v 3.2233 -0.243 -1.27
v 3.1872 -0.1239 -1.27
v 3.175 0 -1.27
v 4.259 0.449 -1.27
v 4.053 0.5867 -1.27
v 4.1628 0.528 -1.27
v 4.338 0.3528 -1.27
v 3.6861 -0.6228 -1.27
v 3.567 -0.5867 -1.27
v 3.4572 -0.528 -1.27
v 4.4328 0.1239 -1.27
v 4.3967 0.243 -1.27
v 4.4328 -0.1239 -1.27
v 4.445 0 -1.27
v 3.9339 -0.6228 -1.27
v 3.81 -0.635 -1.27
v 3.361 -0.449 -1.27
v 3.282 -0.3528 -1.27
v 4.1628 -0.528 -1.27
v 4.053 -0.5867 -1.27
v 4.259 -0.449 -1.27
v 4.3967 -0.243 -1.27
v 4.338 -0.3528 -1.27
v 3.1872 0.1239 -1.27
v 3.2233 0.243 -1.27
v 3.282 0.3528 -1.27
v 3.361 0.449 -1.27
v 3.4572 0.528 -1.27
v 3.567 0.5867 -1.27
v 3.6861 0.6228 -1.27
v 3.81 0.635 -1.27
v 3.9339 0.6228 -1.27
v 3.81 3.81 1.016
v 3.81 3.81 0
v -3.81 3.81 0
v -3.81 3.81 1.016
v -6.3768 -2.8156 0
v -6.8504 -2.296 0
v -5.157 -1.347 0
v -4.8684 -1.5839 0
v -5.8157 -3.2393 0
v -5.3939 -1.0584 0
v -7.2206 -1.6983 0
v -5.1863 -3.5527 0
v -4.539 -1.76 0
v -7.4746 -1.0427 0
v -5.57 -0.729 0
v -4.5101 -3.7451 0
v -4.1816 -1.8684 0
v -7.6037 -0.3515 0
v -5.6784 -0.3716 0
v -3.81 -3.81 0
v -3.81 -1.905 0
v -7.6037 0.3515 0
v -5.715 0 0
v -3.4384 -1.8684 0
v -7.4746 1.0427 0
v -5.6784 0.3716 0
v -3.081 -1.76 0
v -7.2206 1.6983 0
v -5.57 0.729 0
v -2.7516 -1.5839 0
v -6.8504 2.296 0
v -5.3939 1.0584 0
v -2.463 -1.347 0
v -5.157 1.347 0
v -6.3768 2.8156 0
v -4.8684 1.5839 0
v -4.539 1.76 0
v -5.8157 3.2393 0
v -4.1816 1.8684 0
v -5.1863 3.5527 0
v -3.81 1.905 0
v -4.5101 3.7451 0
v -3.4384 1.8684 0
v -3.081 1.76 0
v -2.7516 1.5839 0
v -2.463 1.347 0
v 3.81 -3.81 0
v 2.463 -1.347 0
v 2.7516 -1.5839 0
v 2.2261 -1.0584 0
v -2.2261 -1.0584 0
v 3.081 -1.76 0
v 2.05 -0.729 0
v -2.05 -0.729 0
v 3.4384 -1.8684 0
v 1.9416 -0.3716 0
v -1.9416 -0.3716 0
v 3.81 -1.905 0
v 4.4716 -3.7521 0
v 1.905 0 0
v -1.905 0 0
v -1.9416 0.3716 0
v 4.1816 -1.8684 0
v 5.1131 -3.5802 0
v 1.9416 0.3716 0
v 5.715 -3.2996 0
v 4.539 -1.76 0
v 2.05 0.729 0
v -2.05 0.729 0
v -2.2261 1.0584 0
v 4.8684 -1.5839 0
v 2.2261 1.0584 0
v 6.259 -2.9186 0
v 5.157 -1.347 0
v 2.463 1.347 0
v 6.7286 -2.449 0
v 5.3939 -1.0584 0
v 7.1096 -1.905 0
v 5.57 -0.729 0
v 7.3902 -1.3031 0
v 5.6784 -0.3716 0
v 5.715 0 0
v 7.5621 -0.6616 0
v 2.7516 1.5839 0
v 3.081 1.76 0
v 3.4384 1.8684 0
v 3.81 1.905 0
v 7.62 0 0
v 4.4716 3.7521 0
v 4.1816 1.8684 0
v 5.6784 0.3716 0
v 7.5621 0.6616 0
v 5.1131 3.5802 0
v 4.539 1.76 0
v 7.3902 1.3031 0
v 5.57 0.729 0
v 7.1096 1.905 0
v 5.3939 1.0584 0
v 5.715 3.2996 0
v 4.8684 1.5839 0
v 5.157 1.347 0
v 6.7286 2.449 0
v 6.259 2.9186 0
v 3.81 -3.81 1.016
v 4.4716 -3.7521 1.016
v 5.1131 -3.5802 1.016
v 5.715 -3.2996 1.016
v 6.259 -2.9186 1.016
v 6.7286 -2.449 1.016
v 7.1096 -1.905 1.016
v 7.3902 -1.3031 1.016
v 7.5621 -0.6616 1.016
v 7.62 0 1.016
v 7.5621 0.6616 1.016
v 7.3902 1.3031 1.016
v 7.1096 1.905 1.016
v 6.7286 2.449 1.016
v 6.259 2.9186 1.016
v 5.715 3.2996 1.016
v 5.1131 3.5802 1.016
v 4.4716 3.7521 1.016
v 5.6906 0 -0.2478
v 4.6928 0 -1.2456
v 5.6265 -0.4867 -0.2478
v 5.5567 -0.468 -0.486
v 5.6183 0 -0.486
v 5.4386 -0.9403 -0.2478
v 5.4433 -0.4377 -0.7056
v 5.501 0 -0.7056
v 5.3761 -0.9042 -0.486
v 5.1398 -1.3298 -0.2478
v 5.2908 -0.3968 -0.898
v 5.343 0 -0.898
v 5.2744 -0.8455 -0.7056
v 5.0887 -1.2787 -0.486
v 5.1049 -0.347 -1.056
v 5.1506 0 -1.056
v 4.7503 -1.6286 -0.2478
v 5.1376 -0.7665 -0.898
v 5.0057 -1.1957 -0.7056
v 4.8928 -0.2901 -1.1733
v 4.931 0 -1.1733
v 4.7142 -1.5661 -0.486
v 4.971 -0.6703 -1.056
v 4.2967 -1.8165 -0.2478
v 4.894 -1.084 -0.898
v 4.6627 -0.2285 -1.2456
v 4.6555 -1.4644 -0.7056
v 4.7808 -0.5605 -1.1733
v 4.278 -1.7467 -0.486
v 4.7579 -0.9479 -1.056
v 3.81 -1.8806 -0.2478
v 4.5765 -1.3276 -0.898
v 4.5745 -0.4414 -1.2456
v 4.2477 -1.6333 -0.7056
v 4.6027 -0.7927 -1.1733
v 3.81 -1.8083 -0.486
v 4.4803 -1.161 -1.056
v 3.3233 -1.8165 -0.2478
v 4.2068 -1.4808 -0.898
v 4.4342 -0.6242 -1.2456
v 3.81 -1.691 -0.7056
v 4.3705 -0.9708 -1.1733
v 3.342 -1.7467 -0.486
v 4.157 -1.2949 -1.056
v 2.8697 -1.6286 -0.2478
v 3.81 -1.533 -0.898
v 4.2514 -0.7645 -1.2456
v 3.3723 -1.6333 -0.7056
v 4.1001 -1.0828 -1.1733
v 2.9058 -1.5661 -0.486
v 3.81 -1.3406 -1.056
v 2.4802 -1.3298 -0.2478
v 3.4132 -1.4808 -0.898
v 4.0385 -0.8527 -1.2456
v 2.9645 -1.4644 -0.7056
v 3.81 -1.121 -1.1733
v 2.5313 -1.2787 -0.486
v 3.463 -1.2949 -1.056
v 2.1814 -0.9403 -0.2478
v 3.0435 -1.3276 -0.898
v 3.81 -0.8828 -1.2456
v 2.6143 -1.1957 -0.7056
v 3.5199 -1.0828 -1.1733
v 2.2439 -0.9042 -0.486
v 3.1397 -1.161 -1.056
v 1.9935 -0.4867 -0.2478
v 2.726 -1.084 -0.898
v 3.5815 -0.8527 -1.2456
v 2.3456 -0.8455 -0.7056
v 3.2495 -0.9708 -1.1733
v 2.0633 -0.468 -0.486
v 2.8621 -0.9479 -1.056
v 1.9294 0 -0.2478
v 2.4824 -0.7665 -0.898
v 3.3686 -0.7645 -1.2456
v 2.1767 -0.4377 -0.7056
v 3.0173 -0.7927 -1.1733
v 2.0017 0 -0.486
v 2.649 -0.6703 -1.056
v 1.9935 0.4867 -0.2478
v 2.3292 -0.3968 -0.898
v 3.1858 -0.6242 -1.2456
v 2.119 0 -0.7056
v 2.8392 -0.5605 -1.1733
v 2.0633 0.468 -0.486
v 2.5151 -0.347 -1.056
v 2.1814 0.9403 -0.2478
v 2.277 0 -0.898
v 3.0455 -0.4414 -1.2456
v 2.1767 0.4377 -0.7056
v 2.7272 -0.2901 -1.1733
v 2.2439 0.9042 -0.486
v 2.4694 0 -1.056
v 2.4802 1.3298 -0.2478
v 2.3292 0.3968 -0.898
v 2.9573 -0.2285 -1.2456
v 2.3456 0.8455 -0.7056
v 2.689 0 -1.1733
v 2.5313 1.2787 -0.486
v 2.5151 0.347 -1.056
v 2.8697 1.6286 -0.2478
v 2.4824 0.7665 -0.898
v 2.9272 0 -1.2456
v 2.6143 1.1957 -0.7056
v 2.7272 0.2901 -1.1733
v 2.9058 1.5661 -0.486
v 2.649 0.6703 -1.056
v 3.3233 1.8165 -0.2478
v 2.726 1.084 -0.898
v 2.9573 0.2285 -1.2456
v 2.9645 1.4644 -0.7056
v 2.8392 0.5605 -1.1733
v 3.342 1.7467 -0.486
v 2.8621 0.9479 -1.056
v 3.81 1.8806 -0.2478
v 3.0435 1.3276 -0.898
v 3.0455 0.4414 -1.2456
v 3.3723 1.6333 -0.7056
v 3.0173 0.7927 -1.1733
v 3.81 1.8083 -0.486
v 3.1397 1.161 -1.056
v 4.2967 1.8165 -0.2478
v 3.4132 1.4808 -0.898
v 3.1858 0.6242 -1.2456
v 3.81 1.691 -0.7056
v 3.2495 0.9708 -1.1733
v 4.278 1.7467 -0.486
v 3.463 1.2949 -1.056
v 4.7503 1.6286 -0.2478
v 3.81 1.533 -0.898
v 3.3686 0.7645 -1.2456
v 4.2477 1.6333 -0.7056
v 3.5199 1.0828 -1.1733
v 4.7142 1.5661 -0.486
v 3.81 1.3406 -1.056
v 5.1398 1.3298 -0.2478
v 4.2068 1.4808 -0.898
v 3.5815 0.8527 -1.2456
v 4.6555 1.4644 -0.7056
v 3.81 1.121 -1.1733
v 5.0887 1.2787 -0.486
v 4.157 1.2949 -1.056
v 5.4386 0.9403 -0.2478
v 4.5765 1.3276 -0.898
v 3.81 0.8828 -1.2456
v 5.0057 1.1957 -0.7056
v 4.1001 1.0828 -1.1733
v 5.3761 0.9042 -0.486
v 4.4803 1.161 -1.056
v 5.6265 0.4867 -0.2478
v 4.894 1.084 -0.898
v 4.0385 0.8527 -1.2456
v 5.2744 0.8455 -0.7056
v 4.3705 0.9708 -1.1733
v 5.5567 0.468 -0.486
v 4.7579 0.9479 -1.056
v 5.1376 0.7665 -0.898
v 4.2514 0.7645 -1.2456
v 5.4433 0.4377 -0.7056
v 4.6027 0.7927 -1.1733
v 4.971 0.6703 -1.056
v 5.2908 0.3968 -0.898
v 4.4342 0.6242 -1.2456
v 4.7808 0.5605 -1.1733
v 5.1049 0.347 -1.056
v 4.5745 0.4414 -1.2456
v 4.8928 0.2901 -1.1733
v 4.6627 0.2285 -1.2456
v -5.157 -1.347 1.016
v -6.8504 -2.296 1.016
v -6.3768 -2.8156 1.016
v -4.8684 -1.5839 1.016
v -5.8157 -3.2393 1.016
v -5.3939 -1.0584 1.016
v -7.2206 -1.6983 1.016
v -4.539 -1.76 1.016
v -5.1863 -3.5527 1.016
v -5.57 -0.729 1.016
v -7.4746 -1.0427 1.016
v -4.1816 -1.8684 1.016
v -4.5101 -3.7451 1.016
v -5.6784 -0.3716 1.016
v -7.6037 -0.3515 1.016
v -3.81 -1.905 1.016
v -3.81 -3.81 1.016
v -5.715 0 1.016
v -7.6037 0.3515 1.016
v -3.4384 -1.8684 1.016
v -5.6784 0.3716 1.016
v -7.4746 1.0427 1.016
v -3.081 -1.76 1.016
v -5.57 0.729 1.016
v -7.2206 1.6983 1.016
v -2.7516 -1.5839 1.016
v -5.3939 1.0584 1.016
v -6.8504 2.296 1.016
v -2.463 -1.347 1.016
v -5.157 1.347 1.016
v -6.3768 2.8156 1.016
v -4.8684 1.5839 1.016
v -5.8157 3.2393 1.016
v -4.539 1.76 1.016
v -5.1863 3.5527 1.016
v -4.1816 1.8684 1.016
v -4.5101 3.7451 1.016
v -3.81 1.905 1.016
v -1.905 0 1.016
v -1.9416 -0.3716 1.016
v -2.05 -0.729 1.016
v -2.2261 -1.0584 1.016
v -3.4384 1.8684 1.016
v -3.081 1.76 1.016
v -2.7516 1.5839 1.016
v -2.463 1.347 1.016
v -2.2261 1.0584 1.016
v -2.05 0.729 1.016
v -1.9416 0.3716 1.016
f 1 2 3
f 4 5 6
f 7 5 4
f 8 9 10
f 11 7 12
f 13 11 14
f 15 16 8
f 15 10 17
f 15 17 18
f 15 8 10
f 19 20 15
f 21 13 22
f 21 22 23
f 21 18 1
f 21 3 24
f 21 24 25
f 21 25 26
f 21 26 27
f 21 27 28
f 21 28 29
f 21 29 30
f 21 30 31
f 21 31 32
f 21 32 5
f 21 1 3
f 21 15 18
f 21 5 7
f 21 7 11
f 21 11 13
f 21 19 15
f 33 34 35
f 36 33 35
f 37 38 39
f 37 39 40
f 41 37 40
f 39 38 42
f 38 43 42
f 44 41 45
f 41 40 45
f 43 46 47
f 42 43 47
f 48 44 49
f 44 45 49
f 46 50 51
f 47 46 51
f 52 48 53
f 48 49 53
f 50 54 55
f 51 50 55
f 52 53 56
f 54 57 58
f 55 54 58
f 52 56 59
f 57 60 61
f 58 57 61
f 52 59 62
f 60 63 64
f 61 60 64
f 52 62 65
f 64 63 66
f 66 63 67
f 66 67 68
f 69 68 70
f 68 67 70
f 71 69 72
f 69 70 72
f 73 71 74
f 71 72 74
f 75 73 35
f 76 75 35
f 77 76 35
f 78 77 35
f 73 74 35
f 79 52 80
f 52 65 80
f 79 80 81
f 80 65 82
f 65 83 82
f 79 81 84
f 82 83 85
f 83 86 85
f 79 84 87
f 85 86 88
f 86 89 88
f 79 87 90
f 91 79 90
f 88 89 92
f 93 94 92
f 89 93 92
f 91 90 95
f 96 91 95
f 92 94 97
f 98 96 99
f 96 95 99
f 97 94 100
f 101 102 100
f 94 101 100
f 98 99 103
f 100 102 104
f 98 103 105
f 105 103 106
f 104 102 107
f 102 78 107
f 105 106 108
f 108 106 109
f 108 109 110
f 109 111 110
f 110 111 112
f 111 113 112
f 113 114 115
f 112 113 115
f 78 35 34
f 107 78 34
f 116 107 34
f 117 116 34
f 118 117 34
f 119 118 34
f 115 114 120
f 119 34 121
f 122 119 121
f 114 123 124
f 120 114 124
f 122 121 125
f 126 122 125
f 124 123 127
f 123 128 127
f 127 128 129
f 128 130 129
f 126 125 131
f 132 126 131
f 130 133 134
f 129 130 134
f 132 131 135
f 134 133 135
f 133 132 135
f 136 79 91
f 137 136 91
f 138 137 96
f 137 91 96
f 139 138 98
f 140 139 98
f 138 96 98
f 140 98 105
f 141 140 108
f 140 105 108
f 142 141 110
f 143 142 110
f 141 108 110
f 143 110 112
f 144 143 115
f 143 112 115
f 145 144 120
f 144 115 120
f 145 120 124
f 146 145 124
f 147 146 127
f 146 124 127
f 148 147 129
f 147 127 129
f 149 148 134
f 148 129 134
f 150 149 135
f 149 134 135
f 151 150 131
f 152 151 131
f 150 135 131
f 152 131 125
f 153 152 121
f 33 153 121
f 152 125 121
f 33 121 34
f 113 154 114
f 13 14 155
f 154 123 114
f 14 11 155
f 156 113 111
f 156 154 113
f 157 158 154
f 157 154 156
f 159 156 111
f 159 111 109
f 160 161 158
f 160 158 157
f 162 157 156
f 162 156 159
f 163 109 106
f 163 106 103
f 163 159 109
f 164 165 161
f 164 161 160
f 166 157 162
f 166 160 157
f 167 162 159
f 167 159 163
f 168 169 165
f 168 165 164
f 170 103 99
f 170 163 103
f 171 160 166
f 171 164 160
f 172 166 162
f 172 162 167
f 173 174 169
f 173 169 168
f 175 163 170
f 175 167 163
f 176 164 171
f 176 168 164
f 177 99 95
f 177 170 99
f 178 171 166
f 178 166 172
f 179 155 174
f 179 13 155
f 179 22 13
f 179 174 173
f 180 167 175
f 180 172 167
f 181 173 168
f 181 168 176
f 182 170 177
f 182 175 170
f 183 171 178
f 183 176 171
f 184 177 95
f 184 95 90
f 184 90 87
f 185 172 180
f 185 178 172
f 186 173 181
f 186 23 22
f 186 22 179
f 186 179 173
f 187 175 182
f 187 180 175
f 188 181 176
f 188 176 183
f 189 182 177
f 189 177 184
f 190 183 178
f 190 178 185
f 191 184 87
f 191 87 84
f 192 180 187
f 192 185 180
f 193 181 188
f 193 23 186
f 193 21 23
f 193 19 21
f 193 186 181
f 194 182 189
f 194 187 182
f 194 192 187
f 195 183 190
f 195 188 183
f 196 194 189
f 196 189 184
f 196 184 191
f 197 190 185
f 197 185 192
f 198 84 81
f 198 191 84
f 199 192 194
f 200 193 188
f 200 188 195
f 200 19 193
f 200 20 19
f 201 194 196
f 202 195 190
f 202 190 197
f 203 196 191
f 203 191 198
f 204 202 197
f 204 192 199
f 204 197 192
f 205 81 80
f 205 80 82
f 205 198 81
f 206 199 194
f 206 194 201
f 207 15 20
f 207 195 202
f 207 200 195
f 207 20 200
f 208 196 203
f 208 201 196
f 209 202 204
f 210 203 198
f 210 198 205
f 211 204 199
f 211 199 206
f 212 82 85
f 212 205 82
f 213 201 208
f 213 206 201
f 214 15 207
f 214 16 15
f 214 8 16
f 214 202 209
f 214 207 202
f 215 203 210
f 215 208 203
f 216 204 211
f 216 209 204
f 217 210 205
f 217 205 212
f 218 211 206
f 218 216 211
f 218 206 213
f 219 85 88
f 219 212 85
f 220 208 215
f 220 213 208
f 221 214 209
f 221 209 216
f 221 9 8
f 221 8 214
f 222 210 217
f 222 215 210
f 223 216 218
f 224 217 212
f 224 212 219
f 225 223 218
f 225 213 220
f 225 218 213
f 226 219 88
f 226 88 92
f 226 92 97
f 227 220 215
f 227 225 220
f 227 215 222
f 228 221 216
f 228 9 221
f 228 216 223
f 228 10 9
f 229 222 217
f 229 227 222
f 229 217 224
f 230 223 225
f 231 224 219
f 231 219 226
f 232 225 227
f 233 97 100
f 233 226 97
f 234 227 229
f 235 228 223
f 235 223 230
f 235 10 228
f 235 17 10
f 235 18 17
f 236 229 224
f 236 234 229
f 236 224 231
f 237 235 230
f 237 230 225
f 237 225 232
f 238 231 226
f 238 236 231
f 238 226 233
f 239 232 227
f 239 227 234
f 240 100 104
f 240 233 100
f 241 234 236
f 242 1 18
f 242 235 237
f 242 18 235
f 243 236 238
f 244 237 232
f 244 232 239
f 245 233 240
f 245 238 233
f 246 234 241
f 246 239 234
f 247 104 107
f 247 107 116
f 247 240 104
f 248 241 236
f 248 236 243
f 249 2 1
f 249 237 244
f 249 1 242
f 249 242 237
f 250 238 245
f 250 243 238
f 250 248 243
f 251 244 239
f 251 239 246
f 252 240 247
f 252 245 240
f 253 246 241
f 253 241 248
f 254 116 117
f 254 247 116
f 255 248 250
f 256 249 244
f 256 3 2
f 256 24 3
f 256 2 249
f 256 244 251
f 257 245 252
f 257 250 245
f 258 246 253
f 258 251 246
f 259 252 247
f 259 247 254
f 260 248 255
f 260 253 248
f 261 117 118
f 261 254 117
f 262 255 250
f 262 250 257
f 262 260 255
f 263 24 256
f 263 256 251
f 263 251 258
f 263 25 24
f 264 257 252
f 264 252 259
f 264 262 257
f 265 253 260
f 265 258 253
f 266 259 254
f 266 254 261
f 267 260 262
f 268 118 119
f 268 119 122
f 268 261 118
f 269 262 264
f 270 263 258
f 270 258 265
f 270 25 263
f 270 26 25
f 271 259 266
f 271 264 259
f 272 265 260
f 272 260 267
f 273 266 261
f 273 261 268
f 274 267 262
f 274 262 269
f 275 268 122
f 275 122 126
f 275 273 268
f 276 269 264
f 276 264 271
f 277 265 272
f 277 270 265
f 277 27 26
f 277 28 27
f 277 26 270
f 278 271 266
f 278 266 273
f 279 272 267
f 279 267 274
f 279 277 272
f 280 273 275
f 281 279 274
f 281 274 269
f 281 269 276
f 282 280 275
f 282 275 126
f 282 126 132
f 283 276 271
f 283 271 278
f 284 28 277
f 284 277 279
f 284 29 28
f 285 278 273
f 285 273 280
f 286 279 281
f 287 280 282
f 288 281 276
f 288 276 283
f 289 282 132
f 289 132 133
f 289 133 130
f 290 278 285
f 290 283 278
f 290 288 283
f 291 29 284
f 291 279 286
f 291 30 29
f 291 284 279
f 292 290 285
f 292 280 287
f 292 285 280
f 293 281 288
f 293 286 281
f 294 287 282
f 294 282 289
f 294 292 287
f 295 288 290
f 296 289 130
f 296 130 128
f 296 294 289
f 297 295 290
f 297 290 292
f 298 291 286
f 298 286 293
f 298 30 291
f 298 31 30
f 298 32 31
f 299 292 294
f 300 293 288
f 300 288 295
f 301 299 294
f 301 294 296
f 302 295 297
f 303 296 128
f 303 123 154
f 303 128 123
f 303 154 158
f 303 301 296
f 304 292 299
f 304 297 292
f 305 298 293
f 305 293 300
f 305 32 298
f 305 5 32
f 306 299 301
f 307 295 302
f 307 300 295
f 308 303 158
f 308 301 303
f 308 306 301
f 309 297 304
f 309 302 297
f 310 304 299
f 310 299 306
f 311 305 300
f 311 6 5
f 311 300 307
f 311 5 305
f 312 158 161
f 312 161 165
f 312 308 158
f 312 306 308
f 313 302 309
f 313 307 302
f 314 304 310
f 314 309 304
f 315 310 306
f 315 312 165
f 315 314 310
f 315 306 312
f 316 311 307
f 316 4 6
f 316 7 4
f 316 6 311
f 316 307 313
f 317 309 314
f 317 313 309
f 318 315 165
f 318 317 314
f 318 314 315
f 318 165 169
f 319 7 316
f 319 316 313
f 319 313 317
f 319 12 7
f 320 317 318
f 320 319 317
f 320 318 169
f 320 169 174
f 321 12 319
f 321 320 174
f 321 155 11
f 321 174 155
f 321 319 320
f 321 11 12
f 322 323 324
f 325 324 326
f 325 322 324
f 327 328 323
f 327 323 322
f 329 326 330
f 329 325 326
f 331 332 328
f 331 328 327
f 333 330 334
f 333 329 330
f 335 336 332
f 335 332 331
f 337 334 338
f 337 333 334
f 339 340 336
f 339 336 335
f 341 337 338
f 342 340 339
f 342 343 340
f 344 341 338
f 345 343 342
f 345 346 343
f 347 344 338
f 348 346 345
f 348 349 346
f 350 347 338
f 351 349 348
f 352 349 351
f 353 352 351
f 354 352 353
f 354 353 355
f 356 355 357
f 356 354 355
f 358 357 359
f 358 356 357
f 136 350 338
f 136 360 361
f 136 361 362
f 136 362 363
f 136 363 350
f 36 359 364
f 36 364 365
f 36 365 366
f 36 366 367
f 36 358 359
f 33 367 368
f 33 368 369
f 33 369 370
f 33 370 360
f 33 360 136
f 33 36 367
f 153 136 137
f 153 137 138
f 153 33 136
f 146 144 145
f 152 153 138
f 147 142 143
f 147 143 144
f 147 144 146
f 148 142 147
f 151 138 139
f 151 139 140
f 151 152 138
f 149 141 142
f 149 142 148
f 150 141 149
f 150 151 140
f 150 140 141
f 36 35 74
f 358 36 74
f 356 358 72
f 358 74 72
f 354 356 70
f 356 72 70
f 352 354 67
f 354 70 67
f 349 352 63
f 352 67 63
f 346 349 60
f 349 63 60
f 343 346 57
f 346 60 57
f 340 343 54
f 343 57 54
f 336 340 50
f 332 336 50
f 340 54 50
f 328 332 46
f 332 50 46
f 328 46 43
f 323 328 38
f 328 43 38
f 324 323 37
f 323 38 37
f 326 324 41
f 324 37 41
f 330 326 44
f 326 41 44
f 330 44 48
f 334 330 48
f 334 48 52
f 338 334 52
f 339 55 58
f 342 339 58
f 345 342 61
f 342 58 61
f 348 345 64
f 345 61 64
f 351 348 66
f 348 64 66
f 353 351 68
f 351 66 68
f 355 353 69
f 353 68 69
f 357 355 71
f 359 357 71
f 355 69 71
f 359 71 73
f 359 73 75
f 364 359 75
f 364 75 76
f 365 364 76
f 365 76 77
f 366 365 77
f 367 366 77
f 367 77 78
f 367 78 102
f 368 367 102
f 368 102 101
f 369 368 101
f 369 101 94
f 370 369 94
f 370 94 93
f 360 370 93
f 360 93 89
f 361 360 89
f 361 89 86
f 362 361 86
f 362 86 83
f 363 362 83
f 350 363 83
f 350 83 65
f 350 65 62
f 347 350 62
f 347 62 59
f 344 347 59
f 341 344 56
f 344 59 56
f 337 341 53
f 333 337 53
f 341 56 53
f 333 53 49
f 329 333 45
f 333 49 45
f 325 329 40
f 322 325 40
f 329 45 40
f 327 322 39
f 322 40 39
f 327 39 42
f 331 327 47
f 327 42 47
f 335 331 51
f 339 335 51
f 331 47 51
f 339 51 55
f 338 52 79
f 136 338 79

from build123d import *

# Parameters (mm, degrees)
F1_DEPTH = 1.016
F3_D     = 3.81
F4_R     = 1.905
F5_DEPTH = 1.27
F6_R     = 1.26999


# Not quite as in the source:
# - a fillet or chamfer is up to 0.001 mm smaller than in the source, because OpenCascade refuses the exact size


with BuildPart() as f1:
    # F0 (on Top) → F1 (new body)
    with BuildSketch(Plane.XY):
        with BuildLine():
            ThreePointArc((3.81, -3.81), (6.5040768363, -2.6940768363), (7.62, 0))
            ThreePointArc((7.62, 0), (6.5040768363, 2.6940768363), (3.81, 3.81))
            ThreePointArc((3.81, 3.81), (1.1159231637, 2.6940768363), (0, 0))
            ThreePointArc((0, 0), (1.1159231637, -2.6940768363), (3.81, -3.81))
        make_face()
        with BuildLine():
            ThreePointArc((0, 0), (1.1159231637, 2.6940768363), (3.81, 3.81))
            Line((3.81, 3.81), (-3.81, 3.81))
            ThreePointArc((-3.81, 3.81), (-1.1159231637, 2.6940768363), (0, 0))
        make_face()
        with BuildLine():
            Line((-3.81, -3.81), (3.81, -3.81))
            ThreePointArc((3.81, -3.81), (1.1159231637, -2.6940768363), (0, 0))
            ThreePointArc((0, 0), (-1.1159231637, -2.6940768363), (-3.81, -3.81))
        make_face()
        with BuildLine():
            ThreePointArc((-3.81, -3.81), (-1.1159231637, -2.6940768363), (0, 0))
            ThreePointArc((0, 0), (-1.1159231637, 2.6940768363), (-3.81, 3.81))
            ThreePointArc((-3.81, 3.81), (-7.62, 0), (-3.81, -3.81))
        make_face()
    extrude(amount=F1_DEPTH)

    # F3 (through all)
    with Locations(Plane.XY.offset(1.016)):
        with Locations((-3.81, 0)):
            Hole(F3_D / 2)

    # F4 (on face) → F5 (join)
    with BuildSketch(Plane(origin=(0, 0, 0), x_dir=(1, 0, 0), z_dir=(0, 0, -1))):
        with Locations((3.81, 0)):
            Circle(F4_R)
    extrude(amount=F5_DEPTH)

    # F6 (radius 1.27 in the source; OpenCascade refuses exactly that, so slightly less here)
    f6_edges = [f1.edges().sort_by_distance(p)[0] for p in [
        (1.905, 0, -1.27),
    ]]
    fillet(f6_edges, radius=F6_R)


solid = f1.part
